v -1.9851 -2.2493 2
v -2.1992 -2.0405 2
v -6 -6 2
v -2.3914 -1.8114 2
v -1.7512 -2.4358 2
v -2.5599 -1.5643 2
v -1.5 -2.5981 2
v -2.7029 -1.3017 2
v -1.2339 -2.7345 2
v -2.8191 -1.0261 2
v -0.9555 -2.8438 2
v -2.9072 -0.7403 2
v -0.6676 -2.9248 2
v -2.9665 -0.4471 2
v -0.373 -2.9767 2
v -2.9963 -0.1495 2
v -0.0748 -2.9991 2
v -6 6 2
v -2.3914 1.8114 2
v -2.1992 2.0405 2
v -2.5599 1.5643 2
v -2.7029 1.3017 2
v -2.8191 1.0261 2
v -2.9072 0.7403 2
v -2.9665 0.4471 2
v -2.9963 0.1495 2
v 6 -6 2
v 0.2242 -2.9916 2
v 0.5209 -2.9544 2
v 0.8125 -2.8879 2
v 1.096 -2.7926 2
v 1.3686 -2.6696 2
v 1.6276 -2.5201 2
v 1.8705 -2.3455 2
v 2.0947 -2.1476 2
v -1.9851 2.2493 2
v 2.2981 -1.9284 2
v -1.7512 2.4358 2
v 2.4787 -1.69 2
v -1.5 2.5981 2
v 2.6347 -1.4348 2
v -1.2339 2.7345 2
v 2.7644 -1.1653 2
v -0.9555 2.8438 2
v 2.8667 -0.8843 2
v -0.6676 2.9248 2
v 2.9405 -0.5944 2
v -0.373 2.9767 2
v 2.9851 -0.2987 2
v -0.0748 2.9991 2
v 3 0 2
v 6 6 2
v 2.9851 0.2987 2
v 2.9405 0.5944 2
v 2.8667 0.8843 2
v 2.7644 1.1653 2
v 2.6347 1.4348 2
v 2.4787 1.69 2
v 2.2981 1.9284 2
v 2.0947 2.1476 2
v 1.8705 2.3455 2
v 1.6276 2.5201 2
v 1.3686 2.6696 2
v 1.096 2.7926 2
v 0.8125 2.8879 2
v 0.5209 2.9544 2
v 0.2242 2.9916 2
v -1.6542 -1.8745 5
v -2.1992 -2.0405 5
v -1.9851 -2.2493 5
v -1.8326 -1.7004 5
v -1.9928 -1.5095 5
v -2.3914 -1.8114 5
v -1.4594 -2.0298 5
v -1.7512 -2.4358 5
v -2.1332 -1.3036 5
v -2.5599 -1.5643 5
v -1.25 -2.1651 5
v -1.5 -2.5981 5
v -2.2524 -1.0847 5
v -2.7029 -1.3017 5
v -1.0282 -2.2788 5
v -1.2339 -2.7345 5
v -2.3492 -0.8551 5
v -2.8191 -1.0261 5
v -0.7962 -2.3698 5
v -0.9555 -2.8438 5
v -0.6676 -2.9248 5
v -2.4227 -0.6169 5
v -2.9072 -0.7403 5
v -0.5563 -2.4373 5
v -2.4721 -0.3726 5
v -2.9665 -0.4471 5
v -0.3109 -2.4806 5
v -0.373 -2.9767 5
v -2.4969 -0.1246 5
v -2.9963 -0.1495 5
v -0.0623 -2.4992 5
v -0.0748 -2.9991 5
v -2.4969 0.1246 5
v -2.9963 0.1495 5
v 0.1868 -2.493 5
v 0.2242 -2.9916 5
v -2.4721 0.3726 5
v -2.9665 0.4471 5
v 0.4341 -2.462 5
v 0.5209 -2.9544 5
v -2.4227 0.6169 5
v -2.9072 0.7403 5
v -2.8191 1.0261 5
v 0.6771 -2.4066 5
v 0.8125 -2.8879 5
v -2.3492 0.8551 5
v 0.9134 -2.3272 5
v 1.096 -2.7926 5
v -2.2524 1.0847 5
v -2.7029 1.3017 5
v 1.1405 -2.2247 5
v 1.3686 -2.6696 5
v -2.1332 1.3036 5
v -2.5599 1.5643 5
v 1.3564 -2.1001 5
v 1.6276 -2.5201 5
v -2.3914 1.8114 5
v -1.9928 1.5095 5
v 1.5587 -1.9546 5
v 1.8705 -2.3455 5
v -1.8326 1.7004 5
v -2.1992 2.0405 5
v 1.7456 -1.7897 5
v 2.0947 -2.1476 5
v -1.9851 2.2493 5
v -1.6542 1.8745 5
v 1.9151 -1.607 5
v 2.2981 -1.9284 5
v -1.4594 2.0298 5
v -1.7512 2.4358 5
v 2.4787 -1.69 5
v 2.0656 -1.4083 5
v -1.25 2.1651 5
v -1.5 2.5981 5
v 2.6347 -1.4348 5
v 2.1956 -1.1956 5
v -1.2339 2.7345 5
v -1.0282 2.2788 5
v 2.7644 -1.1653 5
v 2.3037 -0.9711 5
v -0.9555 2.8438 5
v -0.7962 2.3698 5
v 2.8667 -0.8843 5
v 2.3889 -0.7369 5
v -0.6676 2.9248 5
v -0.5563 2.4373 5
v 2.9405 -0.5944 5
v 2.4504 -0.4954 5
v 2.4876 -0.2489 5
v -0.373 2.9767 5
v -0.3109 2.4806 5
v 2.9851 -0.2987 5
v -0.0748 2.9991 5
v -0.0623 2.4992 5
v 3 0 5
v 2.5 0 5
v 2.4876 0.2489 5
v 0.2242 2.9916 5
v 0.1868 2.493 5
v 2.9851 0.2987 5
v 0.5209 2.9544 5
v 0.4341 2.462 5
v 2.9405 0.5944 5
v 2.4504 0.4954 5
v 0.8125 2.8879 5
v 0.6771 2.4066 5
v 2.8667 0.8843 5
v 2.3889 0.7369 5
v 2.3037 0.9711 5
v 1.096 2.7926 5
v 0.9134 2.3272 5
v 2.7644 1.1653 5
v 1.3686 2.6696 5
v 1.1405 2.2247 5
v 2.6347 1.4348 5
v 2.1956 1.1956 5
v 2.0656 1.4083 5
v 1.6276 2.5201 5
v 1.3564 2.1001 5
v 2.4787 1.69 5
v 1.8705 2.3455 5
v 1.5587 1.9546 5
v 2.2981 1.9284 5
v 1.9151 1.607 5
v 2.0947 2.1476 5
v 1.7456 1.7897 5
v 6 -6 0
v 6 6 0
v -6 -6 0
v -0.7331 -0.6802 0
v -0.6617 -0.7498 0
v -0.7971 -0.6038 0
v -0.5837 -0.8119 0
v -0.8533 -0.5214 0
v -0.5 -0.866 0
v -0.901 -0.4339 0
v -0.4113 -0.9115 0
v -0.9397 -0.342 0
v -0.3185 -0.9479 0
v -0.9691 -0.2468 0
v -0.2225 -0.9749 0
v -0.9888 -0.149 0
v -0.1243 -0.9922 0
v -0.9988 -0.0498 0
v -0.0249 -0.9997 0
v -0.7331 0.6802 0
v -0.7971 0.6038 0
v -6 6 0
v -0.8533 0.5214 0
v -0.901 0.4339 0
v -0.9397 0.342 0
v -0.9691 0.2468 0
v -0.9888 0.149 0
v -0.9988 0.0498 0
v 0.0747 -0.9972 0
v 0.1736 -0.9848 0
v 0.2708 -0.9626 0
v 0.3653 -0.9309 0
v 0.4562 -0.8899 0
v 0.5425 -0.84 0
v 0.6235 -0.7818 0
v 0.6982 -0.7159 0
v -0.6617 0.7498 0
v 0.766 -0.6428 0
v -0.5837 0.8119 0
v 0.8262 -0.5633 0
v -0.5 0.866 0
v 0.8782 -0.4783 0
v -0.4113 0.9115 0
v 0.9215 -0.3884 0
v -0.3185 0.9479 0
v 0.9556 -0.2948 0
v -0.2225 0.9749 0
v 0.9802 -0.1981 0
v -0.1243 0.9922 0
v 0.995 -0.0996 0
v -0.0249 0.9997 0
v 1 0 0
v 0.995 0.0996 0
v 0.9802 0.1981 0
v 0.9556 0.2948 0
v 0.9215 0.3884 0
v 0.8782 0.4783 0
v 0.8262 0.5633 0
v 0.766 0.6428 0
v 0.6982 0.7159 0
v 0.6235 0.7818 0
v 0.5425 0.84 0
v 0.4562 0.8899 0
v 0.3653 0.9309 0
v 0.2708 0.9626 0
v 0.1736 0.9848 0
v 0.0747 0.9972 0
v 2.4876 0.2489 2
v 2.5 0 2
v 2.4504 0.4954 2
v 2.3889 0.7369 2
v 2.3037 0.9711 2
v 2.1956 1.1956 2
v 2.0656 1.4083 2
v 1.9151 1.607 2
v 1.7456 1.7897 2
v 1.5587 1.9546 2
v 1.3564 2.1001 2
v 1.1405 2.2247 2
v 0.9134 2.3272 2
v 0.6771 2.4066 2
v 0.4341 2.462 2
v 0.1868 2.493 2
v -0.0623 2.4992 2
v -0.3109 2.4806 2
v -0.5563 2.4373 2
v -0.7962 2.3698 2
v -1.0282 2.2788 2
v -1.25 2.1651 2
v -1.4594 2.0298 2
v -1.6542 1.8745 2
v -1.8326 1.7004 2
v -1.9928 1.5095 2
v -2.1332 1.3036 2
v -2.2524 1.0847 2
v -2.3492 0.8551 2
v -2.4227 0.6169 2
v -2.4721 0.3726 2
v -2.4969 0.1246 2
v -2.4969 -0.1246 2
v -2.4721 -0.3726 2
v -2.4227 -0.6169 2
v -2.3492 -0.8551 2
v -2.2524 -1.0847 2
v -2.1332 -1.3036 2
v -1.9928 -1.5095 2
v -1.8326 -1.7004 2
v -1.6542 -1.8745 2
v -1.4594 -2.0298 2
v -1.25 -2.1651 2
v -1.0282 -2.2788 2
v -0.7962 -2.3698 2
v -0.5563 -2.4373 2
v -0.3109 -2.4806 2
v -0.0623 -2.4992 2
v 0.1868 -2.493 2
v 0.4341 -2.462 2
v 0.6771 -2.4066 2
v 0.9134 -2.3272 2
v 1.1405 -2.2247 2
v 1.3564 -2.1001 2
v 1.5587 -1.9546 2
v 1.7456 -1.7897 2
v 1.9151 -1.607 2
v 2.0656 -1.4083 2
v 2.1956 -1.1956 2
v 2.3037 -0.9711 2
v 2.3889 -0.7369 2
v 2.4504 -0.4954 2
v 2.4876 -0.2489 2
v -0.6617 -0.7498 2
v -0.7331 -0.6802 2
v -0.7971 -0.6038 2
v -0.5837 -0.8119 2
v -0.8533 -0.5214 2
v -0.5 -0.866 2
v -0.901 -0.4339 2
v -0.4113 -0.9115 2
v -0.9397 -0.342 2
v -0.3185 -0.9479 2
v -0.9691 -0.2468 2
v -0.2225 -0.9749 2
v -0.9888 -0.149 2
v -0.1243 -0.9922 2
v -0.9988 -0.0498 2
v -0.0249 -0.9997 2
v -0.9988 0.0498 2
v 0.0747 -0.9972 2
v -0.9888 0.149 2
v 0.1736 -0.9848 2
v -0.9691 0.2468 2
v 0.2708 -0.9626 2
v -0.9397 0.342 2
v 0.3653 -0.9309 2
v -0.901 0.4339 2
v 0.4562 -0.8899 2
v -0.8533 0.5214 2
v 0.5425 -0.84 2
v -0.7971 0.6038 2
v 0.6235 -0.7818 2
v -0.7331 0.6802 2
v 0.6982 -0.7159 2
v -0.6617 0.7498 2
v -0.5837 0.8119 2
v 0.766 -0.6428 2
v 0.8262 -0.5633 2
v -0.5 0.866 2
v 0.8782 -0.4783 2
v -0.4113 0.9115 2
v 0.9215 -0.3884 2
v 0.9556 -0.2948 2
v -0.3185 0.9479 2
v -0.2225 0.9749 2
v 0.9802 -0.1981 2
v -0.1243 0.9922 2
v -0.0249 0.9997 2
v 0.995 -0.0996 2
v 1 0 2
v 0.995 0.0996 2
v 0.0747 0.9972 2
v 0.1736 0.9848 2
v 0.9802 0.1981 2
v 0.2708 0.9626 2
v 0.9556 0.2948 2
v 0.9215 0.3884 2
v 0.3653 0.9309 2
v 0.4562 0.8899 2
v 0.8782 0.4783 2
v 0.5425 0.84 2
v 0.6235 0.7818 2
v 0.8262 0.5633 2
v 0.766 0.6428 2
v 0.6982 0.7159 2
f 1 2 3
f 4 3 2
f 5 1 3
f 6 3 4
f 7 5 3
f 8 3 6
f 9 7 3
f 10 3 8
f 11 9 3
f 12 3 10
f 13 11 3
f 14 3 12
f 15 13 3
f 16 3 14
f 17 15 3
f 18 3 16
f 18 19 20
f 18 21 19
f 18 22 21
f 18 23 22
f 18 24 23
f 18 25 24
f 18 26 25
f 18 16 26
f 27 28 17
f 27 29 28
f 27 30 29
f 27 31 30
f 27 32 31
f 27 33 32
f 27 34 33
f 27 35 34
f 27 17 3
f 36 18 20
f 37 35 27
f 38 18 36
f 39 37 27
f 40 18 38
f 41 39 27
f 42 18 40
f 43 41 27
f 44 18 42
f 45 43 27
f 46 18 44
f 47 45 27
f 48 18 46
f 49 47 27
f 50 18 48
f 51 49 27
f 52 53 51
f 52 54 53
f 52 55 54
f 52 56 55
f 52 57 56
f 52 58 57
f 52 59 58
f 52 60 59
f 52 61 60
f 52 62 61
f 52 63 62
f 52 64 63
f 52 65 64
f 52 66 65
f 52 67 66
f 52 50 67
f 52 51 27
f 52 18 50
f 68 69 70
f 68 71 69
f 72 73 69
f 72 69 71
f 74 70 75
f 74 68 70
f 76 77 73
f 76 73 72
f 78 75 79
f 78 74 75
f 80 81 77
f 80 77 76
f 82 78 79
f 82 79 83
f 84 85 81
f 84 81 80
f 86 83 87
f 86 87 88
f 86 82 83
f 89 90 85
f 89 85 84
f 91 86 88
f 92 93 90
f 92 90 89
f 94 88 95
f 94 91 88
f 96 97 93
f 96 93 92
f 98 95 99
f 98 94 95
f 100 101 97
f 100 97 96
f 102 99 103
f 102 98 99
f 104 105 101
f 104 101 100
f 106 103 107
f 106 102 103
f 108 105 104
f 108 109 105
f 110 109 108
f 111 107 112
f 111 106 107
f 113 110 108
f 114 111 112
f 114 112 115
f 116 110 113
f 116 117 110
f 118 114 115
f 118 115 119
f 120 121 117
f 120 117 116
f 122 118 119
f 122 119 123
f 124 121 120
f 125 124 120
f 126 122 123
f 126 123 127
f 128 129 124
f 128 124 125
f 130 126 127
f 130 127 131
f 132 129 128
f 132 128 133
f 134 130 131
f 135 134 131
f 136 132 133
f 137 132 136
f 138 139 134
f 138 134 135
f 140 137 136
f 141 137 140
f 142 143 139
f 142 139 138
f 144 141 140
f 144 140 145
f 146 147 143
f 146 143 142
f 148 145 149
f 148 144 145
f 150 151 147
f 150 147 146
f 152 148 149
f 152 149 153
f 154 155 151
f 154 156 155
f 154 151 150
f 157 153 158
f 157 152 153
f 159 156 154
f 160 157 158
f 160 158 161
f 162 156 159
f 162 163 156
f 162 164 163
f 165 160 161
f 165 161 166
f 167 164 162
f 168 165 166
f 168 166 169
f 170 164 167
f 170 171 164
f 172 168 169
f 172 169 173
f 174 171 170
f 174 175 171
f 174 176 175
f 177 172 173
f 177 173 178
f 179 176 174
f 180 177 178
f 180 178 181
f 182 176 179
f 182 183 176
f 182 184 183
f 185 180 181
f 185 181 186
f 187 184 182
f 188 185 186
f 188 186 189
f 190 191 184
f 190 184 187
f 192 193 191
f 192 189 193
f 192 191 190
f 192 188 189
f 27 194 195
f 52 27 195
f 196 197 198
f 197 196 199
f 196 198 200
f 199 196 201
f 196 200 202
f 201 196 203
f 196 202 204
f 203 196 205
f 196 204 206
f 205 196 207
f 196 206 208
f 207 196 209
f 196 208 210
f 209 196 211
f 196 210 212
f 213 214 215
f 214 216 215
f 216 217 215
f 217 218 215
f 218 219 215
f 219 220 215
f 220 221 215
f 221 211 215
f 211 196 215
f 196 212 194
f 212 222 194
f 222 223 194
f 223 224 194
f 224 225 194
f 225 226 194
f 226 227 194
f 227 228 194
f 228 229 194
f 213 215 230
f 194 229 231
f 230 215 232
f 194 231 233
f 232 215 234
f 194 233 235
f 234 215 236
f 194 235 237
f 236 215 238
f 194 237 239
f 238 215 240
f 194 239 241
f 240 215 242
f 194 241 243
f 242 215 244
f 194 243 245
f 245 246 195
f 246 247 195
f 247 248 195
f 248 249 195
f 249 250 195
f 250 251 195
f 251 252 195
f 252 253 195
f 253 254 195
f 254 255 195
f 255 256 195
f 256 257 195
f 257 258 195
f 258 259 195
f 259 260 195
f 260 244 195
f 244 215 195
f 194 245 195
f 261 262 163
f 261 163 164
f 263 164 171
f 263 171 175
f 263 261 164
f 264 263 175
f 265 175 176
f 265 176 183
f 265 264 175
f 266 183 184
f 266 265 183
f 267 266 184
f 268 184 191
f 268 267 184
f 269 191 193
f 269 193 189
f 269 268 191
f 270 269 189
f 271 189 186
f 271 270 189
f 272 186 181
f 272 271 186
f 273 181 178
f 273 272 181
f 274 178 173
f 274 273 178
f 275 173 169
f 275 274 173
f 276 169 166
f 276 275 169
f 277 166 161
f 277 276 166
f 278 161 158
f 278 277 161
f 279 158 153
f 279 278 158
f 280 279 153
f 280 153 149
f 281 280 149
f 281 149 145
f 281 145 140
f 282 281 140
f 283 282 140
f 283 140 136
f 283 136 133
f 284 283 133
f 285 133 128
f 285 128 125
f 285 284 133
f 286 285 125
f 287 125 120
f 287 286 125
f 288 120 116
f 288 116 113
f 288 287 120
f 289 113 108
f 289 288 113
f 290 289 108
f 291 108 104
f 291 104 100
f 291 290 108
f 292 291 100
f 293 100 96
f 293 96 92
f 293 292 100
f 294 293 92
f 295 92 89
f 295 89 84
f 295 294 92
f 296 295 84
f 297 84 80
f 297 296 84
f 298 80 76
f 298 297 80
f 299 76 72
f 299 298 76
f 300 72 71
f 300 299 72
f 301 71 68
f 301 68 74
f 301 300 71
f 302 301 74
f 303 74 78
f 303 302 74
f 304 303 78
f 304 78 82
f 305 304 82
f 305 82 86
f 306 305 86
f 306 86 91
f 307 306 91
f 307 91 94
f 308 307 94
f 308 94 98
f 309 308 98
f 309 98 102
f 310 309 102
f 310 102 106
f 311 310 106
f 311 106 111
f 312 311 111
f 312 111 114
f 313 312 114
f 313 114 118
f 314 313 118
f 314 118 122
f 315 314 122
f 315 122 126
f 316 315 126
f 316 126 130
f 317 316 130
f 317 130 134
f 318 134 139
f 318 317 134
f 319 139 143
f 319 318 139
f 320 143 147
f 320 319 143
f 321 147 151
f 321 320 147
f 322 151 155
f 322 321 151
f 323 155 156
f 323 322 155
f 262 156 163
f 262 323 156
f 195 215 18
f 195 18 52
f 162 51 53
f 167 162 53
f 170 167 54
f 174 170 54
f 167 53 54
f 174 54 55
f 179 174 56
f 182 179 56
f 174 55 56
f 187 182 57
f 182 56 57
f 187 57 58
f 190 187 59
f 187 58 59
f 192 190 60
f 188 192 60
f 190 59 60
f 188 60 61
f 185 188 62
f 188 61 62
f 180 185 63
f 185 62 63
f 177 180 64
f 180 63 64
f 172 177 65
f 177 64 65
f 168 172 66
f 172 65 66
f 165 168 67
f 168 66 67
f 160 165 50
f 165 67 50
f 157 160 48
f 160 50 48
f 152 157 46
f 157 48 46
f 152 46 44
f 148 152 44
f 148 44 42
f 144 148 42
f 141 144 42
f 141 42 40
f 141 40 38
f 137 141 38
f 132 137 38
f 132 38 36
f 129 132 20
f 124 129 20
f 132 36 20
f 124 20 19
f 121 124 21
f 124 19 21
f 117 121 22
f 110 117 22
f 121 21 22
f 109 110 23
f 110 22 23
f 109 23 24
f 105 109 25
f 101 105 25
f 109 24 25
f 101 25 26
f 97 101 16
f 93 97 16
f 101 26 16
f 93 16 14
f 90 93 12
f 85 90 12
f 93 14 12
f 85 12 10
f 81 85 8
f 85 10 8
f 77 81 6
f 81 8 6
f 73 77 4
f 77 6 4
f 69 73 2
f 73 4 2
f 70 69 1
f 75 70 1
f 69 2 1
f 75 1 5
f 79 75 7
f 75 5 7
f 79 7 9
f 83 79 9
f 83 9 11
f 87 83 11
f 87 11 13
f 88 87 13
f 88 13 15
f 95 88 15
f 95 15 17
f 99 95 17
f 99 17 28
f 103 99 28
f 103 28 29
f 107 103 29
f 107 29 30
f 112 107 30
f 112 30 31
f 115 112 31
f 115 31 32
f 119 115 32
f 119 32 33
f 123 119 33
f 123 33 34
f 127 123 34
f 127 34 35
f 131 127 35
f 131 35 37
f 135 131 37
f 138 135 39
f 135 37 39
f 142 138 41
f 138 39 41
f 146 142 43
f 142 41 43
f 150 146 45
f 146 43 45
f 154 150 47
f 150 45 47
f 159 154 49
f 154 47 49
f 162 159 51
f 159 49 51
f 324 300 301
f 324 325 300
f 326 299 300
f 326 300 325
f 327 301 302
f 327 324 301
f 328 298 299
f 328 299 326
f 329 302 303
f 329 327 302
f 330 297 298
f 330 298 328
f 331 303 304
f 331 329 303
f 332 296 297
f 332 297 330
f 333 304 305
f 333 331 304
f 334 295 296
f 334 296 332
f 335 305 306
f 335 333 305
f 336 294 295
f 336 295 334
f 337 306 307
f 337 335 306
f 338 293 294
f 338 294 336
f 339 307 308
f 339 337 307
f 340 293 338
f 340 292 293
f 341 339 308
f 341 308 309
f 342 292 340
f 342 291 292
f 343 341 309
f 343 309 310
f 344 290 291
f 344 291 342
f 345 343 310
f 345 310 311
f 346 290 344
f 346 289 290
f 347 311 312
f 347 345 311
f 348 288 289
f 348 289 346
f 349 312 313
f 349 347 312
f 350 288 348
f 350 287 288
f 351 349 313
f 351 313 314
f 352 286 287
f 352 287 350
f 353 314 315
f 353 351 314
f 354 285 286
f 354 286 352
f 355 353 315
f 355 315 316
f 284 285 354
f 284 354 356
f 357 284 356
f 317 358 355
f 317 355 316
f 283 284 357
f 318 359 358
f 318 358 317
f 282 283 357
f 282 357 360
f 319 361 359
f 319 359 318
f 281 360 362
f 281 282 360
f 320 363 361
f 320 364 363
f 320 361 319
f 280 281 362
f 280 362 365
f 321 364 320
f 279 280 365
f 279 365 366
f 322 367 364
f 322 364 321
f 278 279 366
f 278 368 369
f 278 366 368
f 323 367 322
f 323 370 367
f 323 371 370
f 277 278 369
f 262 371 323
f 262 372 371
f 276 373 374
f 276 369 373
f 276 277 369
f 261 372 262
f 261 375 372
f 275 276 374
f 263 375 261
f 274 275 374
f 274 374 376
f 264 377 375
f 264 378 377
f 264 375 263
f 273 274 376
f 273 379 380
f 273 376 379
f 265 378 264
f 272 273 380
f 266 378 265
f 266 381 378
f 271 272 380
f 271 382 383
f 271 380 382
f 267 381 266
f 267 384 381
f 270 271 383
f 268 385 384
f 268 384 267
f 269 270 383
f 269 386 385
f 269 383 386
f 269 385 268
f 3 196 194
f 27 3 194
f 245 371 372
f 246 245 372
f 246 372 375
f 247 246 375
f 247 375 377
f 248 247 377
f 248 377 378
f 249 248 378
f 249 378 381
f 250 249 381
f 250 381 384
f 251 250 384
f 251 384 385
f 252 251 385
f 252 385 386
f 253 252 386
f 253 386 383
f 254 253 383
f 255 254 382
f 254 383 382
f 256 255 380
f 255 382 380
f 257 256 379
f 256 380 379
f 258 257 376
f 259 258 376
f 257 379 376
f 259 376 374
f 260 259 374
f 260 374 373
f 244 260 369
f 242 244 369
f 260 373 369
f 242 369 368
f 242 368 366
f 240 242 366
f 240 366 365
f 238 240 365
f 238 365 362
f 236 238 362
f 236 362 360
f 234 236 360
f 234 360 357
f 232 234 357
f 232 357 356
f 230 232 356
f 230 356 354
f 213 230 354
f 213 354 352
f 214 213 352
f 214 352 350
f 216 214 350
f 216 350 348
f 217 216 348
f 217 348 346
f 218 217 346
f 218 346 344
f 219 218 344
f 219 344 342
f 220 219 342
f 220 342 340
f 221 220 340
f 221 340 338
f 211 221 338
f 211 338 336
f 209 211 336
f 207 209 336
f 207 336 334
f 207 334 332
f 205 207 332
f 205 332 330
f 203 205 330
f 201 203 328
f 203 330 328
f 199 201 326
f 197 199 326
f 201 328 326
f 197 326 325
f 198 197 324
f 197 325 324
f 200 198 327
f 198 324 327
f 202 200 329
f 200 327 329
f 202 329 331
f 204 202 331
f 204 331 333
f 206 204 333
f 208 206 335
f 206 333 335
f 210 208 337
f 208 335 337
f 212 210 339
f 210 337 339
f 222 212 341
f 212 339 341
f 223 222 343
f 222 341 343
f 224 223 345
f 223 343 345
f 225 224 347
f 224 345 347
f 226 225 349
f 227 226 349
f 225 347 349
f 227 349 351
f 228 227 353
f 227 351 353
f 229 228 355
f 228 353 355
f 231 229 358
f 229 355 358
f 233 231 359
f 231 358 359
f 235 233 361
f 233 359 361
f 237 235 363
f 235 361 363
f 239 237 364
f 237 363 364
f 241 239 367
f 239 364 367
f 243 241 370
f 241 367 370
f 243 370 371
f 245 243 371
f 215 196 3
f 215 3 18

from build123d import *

# Parameters (mm, degrees)
SKETCH1_W           = 12
SKETCH1_H           = 12
BOSS_EXTRUDE1_DEPTH = 2
SKETCH2_R           = 3
SKETCH2_R_2         = 2.5
BOSS_EXTRUDE2_DEPTH = 3
SKETCH5_R           = 1
CUT_EXTRUDE1_DEPTH  = 10


with BuildPart() as part:
    # Sketch1 → Boss-Extrude1 (new body)
    with BuildSketch(Plane.XY):
        Rectangle(SKETCH1_W, SKETCH1_H)
    extrude(amount=BOSS_EXTRUDE1_DEPTH)

    # Sketch2 → Boss-Extrude2 (add)
    with BuildSketch(Plane.XY.offset(2)):
        Circle(SKETCH2_R)
        Circle(SKETCH2_R_2, mode=Mode.SUBTRACT)
    extrude(amount=BOSS_EXTRUDE2_DEPTH)

    # Sketch5 → Cut-Extrude1 (cut, through all)
    with BuildSketch(Plane.XY.offset(2)):
        Circle(SKETCH5_R)
    extrude(amount=-CUT_EXTRUDE1_DEPTH, mode=Mode.SUBTRACT)


solid = part.part
